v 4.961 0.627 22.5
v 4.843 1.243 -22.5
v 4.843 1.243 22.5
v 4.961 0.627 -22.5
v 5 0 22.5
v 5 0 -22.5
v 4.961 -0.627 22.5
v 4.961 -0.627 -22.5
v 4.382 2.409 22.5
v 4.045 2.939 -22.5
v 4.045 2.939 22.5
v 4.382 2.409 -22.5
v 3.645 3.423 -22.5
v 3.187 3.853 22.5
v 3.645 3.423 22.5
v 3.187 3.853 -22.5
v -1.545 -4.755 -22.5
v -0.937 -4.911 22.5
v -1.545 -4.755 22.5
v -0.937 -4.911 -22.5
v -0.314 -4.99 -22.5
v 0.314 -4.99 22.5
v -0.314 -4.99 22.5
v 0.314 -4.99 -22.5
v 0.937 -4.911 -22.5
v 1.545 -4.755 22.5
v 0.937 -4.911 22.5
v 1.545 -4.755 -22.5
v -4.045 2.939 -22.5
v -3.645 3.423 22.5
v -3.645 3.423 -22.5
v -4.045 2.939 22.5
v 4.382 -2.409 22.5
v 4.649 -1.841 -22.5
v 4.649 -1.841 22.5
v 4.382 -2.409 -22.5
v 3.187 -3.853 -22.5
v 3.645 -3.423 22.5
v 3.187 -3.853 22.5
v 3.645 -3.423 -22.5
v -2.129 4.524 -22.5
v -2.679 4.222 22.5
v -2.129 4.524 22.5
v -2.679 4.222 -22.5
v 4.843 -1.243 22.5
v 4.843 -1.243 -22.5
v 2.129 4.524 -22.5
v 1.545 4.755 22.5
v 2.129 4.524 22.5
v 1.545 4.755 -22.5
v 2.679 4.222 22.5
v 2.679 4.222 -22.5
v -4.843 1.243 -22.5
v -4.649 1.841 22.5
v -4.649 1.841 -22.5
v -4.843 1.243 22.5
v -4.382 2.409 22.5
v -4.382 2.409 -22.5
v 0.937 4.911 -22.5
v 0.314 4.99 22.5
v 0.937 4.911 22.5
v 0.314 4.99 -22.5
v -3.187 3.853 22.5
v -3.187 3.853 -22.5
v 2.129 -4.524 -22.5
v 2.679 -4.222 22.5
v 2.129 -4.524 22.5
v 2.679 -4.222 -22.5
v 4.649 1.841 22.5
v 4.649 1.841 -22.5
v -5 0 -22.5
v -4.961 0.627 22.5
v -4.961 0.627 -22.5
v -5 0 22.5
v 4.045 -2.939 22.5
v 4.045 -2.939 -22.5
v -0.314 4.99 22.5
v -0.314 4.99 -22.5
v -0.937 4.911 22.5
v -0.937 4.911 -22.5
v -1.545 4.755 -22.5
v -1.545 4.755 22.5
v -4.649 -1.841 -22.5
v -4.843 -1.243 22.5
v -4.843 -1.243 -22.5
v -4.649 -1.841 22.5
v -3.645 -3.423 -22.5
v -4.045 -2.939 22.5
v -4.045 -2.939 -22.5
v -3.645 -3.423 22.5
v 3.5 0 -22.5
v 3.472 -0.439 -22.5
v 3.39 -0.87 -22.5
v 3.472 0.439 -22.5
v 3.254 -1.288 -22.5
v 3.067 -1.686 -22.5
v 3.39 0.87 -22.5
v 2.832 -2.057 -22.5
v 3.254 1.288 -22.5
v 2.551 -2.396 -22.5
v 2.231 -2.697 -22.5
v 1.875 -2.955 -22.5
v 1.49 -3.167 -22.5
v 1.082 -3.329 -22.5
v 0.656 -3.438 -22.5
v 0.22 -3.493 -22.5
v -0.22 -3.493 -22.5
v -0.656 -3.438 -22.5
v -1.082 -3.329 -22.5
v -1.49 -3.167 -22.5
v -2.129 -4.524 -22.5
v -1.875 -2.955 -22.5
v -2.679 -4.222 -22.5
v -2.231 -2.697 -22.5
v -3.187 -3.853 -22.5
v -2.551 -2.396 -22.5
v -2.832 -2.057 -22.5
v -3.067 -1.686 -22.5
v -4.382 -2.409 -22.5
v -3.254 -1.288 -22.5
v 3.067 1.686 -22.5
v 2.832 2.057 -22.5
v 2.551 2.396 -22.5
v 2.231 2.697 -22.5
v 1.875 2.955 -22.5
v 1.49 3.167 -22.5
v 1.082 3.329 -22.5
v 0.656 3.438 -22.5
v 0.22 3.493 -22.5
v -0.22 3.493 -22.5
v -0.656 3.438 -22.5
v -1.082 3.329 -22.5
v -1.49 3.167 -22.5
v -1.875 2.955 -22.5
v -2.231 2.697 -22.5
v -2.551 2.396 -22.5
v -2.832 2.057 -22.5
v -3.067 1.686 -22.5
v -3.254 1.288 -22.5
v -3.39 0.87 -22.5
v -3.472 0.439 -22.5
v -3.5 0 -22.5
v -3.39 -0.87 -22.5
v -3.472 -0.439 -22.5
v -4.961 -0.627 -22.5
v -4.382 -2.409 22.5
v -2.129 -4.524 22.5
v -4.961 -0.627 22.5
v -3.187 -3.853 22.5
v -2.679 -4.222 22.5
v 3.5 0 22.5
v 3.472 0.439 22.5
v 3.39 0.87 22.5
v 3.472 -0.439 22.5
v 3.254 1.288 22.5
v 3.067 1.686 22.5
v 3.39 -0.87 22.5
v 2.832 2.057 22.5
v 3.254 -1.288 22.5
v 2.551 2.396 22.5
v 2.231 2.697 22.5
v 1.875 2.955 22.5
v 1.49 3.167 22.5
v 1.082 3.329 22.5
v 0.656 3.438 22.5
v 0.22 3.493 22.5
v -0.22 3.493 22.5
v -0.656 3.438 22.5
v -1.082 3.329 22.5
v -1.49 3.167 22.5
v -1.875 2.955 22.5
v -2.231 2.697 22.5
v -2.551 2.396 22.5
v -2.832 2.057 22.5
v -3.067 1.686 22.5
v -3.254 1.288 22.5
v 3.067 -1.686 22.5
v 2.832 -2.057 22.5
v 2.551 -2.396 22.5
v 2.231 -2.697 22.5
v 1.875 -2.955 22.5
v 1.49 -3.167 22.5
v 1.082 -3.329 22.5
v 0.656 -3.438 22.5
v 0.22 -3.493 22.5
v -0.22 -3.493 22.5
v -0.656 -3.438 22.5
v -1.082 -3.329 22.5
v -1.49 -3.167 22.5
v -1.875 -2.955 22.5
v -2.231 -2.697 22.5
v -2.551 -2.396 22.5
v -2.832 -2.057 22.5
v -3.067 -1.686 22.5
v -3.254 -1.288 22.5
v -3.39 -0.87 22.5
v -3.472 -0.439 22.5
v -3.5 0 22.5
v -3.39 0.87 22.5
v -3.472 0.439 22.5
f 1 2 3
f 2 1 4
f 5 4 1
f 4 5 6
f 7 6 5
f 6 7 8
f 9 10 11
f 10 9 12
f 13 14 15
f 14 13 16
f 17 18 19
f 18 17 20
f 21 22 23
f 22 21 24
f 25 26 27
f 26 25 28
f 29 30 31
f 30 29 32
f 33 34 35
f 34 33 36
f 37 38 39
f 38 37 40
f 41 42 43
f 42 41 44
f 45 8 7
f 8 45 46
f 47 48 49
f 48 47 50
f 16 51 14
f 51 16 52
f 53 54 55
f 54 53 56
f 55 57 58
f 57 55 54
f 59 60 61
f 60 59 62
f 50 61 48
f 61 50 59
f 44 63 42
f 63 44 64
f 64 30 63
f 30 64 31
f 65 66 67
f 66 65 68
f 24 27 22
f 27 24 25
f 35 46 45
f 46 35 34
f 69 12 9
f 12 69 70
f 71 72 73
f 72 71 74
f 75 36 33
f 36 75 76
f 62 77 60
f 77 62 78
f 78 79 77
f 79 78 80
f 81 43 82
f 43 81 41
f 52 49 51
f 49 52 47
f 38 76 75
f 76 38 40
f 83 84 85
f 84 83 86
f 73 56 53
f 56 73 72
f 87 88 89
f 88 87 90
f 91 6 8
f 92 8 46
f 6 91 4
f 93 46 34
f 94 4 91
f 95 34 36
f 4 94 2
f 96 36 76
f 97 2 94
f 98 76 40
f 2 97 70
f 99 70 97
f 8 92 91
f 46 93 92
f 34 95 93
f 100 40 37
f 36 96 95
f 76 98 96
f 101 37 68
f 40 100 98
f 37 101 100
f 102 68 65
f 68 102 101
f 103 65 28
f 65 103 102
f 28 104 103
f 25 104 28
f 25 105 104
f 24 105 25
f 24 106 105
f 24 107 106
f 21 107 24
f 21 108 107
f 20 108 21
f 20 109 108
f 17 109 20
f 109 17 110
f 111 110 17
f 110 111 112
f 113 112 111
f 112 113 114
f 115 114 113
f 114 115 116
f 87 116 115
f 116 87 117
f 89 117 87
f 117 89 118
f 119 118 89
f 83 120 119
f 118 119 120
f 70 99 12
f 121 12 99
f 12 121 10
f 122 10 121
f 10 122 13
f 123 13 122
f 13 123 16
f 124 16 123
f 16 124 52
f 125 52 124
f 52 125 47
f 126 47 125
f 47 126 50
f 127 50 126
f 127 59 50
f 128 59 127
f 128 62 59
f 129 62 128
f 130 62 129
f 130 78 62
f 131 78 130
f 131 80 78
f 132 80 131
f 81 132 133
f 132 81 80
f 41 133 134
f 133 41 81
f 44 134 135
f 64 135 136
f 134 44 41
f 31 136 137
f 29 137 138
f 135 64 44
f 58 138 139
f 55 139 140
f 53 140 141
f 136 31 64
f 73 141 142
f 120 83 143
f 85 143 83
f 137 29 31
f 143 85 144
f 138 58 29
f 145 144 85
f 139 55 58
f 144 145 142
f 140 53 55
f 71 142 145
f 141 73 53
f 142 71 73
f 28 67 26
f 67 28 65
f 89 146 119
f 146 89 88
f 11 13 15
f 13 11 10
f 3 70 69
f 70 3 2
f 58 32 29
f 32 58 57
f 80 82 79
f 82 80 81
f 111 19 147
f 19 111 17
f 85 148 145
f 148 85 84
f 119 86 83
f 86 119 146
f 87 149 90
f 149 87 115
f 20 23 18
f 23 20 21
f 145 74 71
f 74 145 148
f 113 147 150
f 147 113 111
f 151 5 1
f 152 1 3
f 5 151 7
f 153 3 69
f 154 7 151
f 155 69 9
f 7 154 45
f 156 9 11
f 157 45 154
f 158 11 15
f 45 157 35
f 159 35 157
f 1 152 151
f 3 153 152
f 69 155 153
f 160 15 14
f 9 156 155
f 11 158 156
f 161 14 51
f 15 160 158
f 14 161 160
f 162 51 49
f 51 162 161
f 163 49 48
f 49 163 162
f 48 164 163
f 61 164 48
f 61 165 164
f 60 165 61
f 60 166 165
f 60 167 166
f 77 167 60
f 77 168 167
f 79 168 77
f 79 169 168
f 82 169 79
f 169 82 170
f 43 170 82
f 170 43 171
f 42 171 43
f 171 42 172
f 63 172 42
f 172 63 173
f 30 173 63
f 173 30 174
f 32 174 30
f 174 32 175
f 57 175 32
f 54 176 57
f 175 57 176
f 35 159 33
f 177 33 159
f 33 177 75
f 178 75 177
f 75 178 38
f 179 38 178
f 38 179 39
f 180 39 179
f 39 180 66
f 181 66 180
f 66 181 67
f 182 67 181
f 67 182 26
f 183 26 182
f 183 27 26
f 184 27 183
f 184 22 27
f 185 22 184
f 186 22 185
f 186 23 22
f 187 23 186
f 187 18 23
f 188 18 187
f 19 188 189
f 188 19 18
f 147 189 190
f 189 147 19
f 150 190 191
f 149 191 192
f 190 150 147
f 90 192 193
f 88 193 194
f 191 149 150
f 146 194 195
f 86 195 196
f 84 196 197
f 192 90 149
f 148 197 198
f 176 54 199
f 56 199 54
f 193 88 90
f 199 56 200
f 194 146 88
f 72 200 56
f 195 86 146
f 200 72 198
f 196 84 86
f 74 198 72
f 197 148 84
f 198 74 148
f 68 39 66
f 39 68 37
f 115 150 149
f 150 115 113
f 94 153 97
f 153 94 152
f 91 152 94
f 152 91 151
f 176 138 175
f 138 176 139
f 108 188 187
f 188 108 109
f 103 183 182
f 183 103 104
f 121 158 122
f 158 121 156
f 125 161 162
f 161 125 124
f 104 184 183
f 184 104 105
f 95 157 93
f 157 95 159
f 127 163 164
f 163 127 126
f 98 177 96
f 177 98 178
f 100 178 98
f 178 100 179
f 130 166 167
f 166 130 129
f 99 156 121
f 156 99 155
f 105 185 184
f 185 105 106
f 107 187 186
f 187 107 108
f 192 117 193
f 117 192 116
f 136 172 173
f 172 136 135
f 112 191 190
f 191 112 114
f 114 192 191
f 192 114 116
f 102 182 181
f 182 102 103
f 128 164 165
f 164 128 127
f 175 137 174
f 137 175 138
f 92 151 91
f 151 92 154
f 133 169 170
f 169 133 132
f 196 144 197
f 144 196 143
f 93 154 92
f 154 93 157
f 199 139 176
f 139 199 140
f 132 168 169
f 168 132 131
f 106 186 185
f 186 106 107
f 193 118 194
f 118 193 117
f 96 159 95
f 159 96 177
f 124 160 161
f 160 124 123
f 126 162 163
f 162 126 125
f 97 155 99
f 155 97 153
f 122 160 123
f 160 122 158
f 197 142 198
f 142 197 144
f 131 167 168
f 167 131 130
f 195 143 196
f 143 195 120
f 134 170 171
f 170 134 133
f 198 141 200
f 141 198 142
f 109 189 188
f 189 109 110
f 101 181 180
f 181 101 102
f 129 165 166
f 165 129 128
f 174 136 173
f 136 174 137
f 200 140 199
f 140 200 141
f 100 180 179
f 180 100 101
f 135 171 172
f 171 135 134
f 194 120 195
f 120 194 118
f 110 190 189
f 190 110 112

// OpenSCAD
$fn = 50;


difference() {
	union() {
		translate(v = [0, 0, -22.5000000000]) {
			cylinder(h = 45, r = 5.0000000000);
		}
	}
	union() {
		translate(v = [0, 0, -100.0000000000]) {
			cylinder(h = 200, r = 3.5000000000);
		}
	}
}
